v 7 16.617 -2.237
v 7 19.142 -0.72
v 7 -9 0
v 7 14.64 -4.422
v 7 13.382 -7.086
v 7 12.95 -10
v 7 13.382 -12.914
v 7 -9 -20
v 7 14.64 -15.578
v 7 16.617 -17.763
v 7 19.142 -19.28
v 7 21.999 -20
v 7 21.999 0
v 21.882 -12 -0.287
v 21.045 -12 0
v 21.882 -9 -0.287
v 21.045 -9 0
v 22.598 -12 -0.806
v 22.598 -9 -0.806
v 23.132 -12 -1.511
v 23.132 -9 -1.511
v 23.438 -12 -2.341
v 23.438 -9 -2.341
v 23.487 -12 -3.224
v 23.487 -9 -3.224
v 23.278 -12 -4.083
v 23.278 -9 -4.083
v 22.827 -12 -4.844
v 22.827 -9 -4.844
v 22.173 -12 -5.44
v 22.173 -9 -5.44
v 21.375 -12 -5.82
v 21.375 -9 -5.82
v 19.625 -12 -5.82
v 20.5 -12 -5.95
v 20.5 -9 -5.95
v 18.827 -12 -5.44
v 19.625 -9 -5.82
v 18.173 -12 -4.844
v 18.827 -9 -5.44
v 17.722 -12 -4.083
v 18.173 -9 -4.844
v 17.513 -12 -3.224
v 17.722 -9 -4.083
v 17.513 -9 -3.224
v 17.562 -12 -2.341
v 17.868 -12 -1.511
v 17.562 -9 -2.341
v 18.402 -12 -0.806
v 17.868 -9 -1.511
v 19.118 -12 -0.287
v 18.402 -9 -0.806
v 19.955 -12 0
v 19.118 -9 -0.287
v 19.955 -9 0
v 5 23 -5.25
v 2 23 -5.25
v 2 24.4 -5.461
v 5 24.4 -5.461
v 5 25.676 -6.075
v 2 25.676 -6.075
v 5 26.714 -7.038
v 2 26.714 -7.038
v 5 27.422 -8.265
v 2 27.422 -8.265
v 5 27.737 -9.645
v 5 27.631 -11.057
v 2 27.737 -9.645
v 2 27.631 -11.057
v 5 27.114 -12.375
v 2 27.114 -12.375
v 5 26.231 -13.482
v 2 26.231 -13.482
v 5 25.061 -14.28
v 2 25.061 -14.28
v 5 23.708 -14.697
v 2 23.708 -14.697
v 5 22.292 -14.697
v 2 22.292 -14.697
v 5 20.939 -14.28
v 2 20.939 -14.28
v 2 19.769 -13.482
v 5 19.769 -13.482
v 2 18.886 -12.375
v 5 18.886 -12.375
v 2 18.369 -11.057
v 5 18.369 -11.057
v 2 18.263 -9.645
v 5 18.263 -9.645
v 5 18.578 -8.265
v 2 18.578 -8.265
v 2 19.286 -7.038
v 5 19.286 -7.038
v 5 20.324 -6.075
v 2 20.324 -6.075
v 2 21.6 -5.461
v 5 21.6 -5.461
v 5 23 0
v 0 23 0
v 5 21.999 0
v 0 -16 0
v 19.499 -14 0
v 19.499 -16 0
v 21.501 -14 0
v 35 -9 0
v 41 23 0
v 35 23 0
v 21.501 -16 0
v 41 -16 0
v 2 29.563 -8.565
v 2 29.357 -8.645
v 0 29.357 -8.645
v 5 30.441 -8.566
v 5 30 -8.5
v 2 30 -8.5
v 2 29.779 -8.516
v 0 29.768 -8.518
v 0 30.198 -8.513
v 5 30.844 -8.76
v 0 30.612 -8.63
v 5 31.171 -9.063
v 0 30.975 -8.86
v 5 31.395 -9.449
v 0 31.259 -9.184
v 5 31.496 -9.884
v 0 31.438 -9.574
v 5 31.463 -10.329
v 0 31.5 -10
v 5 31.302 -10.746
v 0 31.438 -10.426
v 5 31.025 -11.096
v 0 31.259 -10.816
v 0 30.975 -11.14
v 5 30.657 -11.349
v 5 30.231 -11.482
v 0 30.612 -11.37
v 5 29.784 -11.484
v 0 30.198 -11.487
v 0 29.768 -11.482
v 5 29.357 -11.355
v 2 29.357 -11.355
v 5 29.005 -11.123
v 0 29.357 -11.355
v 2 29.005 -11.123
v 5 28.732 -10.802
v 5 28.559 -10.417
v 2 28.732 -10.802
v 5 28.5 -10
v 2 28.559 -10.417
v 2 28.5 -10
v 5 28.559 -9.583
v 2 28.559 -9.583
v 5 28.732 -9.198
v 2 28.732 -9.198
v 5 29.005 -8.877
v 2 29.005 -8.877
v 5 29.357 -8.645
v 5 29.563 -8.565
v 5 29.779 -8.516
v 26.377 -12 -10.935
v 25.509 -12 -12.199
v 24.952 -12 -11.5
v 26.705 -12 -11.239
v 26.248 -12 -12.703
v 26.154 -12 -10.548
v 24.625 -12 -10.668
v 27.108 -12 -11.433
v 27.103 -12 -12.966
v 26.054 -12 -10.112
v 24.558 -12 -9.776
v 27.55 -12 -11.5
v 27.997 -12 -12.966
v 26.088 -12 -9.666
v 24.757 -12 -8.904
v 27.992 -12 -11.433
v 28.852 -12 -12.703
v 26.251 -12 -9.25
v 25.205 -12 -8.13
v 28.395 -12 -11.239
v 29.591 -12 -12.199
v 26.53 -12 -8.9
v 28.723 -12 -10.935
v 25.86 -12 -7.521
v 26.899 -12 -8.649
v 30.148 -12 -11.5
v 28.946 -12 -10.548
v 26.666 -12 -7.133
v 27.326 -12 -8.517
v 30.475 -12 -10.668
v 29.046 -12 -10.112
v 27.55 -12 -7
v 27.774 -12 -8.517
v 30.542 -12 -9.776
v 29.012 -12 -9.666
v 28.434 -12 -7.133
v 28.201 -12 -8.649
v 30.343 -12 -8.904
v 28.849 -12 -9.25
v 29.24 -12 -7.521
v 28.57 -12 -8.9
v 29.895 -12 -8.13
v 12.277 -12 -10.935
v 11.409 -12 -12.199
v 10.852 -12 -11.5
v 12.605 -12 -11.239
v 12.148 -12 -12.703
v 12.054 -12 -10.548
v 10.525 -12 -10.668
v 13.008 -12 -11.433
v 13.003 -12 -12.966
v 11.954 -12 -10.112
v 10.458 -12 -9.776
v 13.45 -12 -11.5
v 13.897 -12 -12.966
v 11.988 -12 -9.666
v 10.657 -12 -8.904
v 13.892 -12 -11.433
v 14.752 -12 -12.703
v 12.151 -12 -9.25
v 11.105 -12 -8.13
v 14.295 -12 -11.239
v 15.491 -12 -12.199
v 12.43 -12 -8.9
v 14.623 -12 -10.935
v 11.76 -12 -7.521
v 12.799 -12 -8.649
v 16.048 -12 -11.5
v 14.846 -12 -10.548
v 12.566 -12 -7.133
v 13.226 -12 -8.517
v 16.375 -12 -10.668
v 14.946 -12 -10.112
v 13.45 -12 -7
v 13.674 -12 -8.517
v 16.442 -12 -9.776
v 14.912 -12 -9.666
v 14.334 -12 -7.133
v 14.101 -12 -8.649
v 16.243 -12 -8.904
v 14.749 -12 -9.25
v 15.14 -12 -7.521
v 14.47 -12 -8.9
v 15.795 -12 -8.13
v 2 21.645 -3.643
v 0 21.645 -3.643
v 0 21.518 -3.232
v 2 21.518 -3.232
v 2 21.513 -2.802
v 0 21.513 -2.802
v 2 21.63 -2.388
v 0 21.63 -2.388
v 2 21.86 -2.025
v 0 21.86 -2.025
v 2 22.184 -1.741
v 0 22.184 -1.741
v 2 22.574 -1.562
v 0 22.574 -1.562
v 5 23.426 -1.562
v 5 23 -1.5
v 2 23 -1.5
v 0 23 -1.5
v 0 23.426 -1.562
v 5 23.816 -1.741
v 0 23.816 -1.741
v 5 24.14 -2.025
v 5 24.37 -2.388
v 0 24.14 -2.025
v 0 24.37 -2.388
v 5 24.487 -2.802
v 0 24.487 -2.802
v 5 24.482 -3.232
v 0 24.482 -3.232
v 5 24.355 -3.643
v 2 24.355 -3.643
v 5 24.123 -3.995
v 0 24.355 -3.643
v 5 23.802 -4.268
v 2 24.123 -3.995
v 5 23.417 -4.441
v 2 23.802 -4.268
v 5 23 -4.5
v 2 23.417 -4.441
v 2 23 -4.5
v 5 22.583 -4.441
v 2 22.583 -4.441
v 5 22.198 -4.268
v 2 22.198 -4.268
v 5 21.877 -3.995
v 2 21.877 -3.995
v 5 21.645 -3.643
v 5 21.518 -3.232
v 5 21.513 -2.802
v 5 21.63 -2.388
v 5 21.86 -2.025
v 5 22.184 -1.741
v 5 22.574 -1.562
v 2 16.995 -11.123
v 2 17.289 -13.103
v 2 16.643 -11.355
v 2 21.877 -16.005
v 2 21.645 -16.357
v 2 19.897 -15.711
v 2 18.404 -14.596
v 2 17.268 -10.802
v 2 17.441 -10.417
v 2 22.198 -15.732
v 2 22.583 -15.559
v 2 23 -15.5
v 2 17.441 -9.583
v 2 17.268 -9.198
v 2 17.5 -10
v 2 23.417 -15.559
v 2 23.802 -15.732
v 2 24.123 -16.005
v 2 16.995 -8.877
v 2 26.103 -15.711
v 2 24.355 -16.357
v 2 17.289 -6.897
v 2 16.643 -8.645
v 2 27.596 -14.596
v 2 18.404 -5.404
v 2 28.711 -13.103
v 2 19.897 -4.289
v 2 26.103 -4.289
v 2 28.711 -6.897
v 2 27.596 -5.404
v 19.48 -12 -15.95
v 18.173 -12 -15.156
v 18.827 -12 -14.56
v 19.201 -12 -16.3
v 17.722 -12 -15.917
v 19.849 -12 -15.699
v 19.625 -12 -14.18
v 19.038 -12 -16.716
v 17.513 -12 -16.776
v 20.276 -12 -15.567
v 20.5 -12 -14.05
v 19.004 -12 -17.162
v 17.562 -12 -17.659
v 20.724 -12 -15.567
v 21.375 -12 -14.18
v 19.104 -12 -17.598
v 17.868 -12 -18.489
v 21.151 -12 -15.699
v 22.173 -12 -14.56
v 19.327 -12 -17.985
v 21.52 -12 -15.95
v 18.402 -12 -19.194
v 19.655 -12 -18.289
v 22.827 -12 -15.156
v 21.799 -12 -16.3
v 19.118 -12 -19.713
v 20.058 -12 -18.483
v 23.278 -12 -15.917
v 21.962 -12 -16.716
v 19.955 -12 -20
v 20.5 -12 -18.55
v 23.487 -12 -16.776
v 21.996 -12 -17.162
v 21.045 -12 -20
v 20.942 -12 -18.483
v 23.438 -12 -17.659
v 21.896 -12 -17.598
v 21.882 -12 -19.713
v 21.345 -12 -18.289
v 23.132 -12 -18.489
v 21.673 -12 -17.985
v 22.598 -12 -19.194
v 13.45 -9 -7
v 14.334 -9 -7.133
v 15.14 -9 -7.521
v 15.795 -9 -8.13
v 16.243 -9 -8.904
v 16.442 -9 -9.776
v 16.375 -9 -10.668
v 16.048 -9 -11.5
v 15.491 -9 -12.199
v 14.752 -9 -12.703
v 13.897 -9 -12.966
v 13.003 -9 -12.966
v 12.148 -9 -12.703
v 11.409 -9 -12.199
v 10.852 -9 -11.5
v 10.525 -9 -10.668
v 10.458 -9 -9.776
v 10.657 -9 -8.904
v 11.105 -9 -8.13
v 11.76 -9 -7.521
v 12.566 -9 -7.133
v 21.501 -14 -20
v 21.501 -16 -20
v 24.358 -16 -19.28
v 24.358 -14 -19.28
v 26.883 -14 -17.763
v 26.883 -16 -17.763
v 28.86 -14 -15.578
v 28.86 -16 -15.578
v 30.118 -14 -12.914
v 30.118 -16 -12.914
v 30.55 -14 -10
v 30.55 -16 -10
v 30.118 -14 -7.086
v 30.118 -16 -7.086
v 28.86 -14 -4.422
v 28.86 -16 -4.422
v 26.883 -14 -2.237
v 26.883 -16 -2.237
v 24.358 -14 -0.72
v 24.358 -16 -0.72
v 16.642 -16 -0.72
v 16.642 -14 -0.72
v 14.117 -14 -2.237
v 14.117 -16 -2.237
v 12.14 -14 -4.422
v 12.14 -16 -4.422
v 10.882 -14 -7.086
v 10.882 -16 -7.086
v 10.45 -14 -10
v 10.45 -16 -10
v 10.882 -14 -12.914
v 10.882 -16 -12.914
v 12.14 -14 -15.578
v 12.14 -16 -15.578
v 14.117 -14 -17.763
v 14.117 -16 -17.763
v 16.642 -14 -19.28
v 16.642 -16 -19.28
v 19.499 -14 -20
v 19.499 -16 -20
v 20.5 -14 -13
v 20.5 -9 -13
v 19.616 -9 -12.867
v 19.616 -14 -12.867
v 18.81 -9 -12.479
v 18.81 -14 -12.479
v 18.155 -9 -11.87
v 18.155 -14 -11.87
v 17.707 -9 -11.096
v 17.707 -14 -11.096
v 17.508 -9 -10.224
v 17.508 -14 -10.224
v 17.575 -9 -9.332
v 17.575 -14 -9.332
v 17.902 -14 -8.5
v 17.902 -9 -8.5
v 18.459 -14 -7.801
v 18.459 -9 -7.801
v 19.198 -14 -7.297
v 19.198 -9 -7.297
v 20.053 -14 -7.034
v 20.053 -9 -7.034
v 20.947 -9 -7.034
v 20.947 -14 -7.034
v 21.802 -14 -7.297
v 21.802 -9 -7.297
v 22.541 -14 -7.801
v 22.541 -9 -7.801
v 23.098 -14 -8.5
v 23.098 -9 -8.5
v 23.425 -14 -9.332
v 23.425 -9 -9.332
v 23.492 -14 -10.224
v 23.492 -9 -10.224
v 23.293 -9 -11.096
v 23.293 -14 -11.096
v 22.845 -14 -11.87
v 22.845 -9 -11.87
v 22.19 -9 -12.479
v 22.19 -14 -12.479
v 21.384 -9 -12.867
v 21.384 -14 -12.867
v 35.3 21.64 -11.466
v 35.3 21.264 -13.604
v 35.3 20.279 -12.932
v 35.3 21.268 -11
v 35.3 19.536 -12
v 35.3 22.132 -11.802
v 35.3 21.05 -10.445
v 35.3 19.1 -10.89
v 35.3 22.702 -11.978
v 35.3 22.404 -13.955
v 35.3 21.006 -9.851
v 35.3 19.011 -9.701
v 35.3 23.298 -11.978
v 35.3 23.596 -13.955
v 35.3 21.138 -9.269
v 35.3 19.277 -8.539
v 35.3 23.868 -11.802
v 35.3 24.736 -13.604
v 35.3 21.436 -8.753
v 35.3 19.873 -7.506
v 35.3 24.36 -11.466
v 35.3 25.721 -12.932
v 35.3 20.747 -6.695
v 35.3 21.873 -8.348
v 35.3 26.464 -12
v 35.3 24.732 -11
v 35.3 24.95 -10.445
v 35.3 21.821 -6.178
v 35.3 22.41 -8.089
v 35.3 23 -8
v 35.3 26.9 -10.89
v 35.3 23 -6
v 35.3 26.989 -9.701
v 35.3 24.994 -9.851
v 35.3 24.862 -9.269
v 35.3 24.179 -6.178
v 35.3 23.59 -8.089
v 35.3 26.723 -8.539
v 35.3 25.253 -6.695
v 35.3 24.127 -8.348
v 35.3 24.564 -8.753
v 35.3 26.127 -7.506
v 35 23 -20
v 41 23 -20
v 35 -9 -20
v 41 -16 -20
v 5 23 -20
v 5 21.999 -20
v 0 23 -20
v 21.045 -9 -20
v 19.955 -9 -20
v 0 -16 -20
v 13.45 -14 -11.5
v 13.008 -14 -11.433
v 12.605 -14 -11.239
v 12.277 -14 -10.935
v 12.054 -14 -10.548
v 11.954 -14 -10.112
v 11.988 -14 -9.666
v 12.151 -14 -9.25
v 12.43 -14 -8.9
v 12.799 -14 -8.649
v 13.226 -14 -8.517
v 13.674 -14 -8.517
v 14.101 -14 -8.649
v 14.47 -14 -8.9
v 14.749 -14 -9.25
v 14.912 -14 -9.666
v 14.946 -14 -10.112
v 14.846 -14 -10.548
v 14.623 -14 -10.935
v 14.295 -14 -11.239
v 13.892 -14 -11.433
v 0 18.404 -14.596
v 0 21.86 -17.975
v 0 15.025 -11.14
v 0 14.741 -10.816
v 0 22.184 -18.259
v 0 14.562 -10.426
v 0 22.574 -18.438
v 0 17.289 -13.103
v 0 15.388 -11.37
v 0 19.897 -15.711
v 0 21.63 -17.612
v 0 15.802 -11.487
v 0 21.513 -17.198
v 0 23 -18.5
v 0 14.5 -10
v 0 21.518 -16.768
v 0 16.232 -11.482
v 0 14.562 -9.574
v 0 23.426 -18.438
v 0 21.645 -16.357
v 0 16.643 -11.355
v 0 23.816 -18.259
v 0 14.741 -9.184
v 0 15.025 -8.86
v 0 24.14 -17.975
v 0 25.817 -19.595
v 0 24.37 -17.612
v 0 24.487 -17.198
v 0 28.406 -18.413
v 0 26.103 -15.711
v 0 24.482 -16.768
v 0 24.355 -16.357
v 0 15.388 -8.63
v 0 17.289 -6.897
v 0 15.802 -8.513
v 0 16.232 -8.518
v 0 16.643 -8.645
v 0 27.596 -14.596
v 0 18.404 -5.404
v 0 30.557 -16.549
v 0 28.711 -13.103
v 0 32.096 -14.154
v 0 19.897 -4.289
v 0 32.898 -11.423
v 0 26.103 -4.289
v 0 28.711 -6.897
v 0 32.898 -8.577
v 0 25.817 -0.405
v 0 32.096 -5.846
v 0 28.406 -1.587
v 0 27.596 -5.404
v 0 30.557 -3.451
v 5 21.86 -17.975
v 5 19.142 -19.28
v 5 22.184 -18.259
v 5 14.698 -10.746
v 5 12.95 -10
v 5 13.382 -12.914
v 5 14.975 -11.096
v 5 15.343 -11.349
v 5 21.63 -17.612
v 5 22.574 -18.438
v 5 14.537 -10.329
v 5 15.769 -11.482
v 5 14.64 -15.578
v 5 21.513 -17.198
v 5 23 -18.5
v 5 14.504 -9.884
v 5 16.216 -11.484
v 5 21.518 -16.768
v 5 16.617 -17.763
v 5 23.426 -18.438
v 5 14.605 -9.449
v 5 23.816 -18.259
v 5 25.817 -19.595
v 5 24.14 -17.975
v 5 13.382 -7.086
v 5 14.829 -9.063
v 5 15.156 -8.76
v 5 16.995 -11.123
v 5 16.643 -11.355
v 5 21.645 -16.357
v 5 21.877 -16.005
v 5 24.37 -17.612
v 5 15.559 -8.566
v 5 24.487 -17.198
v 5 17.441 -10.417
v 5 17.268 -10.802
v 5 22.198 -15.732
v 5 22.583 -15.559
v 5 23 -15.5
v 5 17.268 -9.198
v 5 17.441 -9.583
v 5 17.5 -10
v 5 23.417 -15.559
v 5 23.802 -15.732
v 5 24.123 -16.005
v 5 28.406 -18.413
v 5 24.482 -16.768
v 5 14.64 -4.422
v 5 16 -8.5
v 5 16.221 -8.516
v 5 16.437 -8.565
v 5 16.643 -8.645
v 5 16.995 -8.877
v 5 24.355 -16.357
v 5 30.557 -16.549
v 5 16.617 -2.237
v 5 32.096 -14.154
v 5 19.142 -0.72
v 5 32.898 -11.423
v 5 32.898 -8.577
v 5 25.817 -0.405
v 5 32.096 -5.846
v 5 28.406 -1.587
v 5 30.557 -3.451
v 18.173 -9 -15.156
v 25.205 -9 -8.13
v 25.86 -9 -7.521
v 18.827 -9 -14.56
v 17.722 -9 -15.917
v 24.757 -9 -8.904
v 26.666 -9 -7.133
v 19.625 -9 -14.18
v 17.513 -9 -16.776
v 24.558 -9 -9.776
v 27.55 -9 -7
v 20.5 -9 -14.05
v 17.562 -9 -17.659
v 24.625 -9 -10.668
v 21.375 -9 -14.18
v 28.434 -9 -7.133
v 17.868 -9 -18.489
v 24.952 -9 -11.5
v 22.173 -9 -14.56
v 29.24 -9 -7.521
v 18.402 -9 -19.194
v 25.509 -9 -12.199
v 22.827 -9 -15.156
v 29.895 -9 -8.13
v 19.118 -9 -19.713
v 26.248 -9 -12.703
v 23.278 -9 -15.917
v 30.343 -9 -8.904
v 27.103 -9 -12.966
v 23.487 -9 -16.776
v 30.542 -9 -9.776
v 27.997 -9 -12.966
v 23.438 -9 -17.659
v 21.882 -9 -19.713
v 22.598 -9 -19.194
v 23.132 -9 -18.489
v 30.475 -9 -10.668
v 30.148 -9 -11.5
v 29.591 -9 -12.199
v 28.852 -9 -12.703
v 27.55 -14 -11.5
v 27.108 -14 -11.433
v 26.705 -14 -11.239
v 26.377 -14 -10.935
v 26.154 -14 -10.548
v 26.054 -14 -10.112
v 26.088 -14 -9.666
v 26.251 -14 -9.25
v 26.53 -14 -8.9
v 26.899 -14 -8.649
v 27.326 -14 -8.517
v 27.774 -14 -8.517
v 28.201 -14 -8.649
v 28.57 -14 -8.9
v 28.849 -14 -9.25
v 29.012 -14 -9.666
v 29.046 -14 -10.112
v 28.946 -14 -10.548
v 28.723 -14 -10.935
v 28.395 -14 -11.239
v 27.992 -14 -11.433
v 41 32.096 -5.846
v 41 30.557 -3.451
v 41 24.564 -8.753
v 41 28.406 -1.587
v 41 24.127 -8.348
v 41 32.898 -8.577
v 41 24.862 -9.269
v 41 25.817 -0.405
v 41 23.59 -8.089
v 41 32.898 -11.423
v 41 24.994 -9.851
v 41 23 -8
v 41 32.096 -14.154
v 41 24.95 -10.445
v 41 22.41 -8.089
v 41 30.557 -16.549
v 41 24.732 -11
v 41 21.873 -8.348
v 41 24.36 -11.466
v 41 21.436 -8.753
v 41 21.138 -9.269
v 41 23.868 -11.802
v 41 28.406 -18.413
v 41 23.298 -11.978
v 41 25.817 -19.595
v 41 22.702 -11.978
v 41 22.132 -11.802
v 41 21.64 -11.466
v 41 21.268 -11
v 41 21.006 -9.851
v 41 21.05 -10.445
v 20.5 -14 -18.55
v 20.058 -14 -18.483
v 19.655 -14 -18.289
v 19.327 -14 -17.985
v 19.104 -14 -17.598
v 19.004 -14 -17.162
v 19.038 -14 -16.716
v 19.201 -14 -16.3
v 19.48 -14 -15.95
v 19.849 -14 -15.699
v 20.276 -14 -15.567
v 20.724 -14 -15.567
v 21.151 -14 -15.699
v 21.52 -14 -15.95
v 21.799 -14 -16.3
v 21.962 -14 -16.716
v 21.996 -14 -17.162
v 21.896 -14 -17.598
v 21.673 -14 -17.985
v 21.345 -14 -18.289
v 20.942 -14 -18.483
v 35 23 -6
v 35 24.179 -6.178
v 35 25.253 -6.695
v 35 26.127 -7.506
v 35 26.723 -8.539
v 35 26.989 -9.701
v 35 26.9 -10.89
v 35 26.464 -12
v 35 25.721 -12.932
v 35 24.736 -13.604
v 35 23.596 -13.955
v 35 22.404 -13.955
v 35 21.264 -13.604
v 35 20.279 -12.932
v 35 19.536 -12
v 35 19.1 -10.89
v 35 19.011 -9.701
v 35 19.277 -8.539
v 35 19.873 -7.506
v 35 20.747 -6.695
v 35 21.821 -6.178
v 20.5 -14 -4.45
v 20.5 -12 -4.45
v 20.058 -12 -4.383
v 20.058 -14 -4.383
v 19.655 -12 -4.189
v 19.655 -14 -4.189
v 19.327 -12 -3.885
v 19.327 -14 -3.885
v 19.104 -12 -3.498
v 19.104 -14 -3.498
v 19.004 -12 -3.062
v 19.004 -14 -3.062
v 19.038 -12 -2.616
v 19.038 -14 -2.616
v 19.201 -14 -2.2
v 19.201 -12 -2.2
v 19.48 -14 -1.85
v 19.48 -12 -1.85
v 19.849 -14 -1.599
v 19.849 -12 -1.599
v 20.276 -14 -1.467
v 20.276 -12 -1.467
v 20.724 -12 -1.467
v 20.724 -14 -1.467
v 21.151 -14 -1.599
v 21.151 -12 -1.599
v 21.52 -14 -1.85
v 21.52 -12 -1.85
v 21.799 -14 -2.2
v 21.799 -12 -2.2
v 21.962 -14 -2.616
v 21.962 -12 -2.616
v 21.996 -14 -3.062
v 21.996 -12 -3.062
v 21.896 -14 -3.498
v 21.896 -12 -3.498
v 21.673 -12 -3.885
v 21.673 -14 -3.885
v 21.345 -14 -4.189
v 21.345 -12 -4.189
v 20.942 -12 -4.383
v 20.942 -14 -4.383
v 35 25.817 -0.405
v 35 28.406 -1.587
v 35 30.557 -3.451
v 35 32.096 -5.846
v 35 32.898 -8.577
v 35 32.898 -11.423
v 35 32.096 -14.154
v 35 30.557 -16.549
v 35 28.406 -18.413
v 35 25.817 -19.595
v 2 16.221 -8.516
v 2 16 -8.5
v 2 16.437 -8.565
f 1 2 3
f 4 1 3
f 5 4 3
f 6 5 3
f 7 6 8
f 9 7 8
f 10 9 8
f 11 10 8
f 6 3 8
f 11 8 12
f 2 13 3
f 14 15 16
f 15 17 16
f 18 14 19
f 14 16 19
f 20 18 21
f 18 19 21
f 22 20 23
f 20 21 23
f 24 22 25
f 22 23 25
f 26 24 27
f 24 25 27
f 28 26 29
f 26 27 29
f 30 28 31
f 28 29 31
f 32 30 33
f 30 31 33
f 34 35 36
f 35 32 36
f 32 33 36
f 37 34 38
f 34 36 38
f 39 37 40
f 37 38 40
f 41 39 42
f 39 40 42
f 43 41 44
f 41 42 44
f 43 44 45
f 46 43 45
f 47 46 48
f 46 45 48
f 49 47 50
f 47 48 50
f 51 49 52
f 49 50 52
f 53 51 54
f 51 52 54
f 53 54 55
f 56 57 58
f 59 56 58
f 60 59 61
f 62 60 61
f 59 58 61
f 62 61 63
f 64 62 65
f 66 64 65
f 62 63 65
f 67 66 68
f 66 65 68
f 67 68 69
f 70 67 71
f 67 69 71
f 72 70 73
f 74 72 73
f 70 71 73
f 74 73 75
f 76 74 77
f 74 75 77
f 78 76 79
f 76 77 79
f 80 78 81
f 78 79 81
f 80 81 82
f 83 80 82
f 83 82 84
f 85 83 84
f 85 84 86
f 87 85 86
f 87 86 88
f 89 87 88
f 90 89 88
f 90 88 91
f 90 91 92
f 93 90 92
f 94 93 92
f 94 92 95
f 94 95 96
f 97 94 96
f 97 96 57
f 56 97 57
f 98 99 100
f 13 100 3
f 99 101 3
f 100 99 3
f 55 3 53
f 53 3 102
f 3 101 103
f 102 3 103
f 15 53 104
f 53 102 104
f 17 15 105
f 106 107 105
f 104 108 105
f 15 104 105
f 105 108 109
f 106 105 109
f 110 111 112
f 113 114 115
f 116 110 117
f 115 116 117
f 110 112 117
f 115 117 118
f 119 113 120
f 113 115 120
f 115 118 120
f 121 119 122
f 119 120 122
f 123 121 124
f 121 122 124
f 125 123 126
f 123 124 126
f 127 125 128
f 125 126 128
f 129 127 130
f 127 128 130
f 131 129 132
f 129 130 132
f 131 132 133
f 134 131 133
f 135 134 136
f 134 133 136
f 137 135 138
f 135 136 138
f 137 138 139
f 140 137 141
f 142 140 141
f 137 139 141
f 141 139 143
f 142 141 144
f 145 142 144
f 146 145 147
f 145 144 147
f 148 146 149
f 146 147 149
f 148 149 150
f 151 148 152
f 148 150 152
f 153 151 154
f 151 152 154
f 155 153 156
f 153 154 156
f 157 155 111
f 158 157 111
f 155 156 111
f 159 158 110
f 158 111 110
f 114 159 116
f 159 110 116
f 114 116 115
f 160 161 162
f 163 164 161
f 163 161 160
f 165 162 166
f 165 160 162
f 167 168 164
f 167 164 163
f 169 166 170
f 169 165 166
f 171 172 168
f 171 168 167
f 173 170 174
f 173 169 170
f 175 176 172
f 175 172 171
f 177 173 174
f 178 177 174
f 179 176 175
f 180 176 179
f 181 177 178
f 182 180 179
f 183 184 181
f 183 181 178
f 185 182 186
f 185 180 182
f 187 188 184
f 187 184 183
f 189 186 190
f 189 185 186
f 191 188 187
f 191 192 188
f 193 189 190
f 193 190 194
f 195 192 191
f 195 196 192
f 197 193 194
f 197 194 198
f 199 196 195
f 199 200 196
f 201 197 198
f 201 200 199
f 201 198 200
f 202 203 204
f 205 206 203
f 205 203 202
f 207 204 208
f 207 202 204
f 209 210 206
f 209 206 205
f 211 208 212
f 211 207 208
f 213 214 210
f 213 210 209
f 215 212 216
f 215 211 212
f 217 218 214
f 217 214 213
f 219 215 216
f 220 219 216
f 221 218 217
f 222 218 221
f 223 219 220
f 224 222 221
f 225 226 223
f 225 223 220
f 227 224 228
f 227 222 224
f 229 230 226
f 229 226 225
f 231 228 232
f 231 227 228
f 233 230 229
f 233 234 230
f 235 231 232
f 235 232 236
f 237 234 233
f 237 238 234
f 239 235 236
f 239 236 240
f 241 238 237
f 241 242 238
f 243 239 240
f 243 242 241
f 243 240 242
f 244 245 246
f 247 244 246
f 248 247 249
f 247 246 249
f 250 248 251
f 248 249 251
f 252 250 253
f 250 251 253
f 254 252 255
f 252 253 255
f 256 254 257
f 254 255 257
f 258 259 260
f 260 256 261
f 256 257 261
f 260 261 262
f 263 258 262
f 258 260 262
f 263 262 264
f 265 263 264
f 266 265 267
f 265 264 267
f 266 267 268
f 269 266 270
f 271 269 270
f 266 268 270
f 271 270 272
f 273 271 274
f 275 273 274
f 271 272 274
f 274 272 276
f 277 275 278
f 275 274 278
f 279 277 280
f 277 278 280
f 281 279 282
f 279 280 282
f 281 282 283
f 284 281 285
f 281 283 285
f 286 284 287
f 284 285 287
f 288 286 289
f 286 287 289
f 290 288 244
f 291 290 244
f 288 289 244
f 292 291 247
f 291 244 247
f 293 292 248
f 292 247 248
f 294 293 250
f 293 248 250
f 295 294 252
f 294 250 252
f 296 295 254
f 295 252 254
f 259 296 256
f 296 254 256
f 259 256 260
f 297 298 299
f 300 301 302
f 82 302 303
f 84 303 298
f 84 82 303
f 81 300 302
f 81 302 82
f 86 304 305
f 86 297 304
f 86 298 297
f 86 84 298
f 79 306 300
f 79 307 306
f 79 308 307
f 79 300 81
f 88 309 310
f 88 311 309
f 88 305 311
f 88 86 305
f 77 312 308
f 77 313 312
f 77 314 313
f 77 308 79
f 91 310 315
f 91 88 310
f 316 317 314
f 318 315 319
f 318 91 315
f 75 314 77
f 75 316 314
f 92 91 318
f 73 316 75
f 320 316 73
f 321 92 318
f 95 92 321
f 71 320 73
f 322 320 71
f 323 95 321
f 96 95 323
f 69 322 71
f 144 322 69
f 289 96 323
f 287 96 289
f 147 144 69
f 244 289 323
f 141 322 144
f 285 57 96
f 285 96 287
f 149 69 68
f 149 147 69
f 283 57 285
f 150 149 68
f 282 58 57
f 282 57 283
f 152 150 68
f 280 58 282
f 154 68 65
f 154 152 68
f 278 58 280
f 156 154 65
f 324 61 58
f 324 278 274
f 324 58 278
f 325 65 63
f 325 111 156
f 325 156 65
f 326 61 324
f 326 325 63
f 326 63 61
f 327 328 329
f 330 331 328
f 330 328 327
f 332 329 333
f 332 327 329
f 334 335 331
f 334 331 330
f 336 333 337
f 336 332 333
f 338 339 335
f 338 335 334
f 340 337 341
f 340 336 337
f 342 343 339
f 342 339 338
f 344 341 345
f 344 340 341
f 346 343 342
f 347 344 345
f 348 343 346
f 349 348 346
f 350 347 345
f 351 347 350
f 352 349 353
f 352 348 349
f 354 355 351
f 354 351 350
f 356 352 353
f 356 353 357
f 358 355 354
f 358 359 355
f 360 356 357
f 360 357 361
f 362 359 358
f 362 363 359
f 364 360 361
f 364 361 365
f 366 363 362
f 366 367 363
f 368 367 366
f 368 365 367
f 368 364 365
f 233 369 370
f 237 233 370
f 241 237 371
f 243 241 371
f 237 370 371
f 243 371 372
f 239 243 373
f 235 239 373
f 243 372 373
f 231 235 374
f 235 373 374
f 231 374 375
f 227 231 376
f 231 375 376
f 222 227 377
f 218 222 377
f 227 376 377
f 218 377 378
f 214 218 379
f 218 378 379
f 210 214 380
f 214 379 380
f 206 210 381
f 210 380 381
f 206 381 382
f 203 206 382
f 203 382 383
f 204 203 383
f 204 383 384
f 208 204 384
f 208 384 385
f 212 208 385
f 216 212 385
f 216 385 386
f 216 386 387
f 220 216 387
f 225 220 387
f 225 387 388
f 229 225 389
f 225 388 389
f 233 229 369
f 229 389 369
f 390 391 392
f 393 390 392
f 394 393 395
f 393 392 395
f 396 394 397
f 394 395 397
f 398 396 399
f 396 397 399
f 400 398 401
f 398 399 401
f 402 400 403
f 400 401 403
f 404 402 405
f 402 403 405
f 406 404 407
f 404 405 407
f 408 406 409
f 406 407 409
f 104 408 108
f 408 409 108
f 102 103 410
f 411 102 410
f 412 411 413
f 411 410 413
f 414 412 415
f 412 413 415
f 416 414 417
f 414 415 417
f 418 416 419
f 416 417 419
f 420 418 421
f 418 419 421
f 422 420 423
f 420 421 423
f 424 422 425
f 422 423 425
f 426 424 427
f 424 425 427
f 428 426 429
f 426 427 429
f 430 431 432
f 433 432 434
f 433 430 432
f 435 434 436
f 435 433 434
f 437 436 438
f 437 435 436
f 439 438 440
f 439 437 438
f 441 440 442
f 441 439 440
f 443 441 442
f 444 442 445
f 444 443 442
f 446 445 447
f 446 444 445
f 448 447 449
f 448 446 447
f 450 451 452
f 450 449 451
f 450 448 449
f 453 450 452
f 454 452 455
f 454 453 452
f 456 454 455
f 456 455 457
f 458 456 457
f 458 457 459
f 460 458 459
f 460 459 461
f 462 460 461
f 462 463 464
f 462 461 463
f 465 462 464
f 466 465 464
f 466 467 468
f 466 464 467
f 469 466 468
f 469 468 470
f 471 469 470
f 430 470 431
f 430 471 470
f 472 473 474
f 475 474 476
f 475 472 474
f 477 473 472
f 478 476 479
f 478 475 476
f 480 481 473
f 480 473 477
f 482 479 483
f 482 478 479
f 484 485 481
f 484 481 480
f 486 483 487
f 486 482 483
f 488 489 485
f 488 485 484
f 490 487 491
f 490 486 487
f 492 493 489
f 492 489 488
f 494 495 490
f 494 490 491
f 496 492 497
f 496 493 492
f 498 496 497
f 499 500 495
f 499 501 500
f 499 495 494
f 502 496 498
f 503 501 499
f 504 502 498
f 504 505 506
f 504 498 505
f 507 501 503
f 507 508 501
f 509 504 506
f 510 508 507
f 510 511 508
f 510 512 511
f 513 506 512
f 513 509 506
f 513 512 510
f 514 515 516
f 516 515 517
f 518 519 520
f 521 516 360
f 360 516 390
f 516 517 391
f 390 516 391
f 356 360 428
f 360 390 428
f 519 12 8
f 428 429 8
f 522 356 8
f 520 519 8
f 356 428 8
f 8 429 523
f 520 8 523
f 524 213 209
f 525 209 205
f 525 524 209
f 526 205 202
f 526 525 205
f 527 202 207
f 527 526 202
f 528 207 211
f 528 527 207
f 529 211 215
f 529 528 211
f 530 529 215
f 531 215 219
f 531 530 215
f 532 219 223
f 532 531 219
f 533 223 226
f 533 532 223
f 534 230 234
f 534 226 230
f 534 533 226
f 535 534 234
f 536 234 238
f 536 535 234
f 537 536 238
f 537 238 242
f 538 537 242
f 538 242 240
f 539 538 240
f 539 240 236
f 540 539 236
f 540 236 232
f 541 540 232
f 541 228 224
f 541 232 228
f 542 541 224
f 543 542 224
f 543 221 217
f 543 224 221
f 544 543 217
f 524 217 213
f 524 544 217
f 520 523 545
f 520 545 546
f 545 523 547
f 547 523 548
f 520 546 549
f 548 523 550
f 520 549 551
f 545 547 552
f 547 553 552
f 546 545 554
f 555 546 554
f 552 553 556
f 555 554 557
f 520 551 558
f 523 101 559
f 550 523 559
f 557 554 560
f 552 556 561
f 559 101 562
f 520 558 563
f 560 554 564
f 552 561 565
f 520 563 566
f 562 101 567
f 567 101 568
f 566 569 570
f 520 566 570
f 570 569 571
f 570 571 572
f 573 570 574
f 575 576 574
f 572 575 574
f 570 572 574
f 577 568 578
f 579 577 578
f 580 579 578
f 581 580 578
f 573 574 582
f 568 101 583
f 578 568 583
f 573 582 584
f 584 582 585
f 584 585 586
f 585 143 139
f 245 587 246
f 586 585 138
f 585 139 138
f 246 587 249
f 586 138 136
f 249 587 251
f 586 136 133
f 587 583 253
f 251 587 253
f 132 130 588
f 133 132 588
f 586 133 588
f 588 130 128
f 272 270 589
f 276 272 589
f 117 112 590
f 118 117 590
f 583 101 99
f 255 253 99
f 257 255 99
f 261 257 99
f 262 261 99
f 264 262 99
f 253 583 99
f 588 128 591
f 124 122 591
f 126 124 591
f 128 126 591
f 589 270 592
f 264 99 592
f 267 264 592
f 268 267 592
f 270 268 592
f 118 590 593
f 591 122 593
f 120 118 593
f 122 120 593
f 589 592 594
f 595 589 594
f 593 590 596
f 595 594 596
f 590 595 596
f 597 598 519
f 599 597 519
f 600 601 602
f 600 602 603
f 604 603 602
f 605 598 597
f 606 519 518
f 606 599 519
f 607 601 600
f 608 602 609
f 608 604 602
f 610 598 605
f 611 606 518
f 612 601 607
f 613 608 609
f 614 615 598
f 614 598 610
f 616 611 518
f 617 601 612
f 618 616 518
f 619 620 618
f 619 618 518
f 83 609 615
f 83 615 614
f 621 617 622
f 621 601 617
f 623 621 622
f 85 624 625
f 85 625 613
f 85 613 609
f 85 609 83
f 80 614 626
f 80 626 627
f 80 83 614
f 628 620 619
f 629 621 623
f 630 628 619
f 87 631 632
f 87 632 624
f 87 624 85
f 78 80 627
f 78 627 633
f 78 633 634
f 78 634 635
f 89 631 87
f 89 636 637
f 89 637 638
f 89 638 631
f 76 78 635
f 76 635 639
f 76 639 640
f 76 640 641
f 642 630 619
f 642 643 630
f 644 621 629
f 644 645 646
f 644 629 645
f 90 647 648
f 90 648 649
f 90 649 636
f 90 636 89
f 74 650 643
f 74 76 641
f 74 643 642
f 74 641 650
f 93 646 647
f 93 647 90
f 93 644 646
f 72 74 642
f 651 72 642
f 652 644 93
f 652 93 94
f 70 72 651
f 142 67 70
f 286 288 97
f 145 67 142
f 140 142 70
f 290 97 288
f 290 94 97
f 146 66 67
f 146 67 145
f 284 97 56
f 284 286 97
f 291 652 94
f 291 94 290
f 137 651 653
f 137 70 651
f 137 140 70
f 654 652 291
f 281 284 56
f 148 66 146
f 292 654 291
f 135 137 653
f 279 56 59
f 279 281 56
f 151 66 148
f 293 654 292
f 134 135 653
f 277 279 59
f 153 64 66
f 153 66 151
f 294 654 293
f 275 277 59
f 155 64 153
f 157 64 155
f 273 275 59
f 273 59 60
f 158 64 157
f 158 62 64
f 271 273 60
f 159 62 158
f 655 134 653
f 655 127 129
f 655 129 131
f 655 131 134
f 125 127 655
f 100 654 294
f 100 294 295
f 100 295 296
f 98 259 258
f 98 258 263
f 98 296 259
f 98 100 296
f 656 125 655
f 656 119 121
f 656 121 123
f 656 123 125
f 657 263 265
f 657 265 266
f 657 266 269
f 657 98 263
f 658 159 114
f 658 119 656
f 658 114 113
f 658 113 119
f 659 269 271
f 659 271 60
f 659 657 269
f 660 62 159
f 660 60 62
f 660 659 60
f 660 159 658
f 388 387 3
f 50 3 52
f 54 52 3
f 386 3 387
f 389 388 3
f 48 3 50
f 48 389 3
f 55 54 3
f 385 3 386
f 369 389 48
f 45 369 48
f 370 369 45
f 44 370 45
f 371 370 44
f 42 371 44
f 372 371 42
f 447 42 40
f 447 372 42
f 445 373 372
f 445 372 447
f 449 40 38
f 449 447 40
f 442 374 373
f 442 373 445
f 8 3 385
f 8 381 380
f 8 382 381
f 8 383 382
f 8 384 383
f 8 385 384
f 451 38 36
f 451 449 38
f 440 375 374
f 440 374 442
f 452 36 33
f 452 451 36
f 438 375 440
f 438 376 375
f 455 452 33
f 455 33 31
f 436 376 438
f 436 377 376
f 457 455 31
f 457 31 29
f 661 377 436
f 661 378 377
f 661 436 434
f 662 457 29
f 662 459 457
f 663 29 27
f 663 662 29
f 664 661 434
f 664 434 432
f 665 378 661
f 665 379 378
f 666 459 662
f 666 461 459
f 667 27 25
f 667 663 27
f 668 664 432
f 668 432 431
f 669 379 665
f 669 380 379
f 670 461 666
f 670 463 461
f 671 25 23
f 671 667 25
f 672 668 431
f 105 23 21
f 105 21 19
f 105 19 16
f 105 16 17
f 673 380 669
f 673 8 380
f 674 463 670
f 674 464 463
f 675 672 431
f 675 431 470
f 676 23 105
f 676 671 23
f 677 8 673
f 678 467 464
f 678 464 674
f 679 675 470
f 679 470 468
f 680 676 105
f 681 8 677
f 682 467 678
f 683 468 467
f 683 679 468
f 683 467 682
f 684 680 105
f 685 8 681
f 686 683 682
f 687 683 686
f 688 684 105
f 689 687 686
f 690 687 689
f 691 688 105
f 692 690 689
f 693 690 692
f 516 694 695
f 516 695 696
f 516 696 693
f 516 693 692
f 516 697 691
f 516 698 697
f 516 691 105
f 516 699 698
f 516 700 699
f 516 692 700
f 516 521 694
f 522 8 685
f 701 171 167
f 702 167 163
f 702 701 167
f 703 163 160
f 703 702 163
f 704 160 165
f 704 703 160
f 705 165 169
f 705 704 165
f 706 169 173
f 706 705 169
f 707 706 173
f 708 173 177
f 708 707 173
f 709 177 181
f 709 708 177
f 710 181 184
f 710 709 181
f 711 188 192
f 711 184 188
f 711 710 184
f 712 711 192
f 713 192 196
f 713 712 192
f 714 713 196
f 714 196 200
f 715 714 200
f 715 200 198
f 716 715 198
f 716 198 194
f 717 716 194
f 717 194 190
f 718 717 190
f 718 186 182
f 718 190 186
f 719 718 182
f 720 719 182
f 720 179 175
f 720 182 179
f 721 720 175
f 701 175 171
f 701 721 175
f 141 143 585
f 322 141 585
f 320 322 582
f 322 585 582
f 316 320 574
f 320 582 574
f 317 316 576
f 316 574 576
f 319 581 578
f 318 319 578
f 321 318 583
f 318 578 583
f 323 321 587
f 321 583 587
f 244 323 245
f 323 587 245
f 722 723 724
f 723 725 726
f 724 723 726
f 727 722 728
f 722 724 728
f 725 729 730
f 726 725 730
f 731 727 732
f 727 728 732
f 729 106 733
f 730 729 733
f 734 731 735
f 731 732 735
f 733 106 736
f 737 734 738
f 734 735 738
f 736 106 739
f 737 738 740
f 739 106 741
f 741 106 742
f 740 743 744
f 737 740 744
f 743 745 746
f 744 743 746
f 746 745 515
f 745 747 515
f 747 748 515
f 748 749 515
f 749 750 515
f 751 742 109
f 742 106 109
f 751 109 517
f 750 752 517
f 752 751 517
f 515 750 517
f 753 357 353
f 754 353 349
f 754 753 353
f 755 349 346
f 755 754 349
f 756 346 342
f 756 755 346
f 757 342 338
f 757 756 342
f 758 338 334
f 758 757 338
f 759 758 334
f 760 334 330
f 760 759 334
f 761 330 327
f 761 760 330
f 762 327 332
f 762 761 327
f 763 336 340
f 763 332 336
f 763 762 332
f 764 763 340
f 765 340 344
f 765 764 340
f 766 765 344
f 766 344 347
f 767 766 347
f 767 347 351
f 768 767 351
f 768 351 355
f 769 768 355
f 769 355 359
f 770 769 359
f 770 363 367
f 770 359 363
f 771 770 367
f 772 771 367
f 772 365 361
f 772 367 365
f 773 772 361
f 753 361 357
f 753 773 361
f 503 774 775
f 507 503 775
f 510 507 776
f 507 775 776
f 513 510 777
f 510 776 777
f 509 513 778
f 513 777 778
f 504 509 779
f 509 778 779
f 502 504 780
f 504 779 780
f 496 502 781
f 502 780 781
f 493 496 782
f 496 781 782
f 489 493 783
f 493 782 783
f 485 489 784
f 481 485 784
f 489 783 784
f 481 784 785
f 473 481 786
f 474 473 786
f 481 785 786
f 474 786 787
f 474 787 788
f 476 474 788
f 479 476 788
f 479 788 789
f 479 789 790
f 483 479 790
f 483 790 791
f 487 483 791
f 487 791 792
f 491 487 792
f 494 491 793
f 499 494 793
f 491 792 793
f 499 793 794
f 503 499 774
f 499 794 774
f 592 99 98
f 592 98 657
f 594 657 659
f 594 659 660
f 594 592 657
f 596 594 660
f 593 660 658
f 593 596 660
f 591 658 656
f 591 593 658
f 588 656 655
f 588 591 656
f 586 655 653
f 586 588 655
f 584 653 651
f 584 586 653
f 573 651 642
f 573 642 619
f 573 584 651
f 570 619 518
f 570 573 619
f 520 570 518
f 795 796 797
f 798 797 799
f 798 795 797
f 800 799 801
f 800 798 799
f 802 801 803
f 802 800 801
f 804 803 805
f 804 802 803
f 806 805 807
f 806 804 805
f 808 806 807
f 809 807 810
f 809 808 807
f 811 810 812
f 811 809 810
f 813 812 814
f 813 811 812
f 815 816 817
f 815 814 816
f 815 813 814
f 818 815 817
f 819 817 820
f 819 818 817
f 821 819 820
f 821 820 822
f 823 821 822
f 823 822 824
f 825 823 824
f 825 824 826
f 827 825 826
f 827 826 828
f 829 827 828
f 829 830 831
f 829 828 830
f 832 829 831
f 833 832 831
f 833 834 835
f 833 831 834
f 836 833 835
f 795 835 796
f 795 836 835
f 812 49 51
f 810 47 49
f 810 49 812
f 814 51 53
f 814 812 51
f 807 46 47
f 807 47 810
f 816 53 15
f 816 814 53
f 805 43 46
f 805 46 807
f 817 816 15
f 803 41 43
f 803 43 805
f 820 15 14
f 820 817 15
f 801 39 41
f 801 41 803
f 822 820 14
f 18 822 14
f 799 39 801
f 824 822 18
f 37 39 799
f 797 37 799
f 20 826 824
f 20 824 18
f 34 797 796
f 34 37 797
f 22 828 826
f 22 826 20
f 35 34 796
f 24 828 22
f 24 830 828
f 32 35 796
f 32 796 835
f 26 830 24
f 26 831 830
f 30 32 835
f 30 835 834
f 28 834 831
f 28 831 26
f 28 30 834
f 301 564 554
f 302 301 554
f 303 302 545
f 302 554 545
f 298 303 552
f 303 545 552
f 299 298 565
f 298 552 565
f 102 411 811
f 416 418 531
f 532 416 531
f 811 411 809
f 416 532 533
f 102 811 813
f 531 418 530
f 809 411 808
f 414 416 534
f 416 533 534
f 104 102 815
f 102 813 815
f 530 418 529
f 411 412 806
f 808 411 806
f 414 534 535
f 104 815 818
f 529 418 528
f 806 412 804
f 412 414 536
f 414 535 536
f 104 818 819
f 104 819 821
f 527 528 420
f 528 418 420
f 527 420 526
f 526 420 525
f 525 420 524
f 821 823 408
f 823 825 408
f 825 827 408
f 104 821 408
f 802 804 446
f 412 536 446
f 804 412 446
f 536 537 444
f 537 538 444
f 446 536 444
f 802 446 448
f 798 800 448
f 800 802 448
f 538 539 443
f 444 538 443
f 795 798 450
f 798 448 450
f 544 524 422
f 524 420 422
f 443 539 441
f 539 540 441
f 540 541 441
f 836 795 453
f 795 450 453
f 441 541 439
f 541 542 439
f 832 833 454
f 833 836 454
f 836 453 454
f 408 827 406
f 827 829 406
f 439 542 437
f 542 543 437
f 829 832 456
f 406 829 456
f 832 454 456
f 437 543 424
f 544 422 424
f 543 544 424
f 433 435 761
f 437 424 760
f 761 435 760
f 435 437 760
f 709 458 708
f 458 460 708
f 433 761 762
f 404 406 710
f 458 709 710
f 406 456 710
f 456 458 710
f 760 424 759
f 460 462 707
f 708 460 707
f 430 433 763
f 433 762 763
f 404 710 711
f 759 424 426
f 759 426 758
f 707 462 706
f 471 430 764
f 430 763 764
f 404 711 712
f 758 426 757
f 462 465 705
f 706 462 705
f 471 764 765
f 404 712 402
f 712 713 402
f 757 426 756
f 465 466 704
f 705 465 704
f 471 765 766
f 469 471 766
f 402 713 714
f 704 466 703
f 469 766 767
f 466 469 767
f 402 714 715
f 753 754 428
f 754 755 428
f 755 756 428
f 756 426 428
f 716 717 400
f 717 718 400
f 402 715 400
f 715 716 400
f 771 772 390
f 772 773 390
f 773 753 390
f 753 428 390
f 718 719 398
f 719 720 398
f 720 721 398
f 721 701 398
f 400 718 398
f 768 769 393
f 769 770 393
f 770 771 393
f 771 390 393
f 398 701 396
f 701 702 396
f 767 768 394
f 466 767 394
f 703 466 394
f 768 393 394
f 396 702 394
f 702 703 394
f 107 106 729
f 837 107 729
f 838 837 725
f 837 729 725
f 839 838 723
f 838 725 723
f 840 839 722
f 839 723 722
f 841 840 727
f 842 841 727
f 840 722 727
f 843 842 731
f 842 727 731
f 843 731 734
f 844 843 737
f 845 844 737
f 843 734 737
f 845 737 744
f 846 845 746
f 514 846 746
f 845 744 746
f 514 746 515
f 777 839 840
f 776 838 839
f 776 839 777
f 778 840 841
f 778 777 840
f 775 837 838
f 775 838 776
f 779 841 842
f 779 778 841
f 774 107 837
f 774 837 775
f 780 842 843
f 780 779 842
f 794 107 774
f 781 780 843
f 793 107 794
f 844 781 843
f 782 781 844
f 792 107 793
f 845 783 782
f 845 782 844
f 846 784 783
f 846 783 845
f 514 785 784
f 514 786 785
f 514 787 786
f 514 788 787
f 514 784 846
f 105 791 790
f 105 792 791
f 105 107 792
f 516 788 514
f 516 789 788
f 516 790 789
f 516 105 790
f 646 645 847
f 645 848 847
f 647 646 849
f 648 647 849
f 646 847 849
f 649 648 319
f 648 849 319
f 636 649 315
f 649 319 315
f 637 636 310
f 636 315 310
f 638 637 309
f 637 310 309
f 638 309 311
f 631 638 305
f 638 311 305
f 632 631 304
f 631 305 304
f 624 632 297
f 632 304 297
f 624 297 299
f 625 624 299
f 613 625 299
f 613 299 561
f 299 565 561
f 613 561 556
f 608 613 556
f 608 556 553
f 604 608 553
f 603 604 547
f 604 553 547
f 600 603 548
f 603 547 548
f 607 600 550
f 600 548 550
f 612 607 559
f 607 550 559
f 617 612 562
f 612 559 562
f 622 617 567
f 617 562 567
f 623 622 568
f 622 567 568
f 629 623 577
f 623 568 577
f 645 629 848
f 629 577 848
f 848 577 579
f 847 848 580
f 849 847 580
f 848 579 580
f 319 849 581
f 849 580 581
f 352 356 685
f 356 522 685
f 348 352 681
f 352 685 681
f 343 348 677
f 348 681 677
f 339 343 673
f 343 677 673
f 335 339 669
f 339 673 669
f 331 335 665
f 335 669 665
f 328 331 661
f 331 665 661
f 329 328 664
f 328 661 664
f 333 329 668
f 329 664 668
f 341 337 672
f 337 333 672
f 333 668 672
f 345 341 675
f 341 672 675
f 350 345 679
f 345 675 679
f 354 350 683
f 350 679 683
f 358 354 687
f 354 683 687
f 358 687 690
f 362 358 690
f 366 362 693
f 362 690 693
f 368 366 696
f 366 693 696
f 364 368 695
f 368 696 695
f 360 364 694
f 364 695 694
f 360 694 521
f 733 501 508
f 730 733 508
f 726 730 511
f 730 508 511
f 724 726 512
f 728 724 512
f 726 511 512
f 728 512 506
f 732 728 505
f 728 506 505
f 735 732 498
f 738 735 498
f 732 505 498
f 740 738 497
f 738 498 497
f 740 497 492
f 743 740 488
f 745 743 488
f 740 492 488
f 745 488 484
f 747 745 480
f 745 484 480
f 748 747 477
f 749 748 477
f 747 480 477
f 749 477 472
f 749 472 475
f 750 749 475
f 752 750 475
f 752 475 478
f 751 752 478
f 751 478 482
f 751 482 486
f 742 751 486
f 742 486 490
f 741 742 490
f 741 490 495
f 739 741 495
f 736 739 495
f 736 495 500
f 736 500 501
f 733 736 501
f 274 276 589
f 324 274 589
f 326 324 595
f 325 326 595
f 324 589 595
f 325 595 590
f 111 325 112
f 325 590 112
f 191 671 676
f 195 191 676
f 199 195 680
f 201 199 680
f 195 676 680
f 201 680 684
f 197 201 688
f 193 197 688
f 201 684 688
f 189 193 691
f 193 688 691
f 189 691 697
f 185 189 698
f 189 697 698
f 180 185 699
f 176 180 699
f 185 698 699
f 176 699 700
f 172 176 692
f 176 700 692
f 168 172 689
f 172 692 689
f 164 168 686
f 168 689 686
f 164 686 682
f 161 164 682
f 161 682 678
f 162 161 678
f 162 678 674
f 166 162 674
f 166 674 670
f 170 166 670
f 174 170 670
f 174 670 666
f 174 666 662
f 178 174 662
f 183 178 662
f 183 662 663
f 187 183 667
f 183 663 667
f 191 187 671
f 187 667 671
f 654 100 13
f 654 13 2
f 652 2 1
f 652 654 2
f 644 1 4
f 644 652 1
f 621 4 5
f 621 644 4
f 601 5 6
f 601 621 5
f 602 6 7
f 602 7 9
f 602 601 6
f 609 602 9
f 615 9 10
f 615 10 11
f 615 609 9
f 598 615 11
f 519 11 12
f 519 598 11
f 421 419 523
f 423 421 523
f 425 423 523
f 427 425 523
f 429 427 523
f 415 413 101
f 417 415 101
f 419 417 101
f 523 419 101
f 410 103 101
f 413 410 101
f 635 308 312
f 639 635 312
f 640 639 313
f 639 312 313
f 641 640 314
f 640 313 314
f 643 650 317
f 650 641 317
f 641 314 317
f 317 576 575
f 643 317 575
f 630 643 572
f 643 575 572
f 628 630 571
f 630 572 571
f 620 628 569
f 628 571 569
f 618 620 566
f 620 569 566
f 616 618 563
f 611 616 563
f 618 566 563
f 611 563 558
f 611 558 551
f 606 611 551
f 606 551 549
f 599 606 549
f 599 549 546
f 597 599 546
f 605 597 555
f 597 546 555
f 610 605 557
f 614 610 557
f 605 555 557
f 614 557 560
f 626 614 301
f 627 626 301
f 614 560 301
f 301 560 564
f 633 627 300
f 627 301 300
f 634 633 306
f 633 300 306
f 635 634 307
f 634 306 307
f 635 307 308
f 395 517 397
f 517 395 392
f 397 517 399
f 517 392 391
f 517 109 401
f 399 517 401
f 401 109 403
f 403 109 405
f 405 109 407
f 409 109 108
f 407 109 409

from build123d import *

# Parameters (mm, degrees)
SKETCH1_W                = 41
SKETCH1_H                = 20
BOSS_EXTRUDE2_DEPTH      = 7
SKETCH3_R                = 10.05
CUT_EXTRUDE8_DEPTH       = 2
SKETCH4_R                = 1.5
SKETCH4_R_2              = 3
CUT_EXTRUDE9_DEPTH       = 29
SKETCH5_W                = 6
SKETCH5_H                = 20
SKETCH5_W_2              = 7
BOSS_EXTRUDE3_DEPTH      = 36
CUT_EXTRUDE10_DEPTH      = 36
SKETCH7_R                = 2
CUT_EXTRUDE11_DEPTH      = 51
SKETCH8_R                = 10.05
CUT_EXTRUDE12_DEPTH      = 2
SKETCH9_R                = 4.75
CUT_EXTRUDE13_DEPTH      = 3.25
SKETCH10_R               = 6.5
CUT_EXTRUDE14_DEPTH      = 2
CUT_EXTRUDE15_DEPTH      = 14
CUT_EXTRUDE15_DEPTH_BACK = 10
SKETCH12_R               = 1.5
CUT_EXTRUDE16_DEPTH      = 10
CUT_EXTRUDE17_DEPTH      = 10
MIRROR1_START            = 5
MIRROR1_DEPTH            = 2
MIRROR1_2_DEPTH          = 7
MIRROR1_3_DEPTH          = 5
CUT_EXTRUDE18_DEPTH      = 10
CUT_EXTRUDE18_DEPTH_BACK = 10
BOSS_EXTRUDE4_START      = 16
BOSS_EXTRUDE4_DEPTH      = 16
BOSS_EXTRUDE6_START      = -21
SKETCH16_W               = 28
SKETCH16_H               = 20
SKETCH16_R               = 1.5
SKETCH16_R_2             = 3
BOSS_EXTRUDE6_DEPTH      = 21
SKETCH18_W               = 28
SKETCH18_H               = 20
CUT_EXTRUDE21_DEPTH      = 16
CROQUIS2_R               = 3
CORTAR_EXTRUIR1_DEPTH    = 3
CROQUIS3_R               = 4
CORTAR_EXTRUIR2_DEPTH    = 0.3


# Read off the part's stored shape, not the designer's step: Mirror1
with BuildPart() as part:
    # Sketch1 → Boss-Extrude2 (new body)
    with BuildSketch(Plane(origin=(0, 0, 0), x_dir=(1, 0, 0), z_dir=(0, 1, 0))):
        with Locations((20.5, 10)):
            Rectangle(SKETCH1_W, SKETCH1_H)
    extrude(amount=BOSS_EXTRUDE2_DEPTH)

    # Sketch3 → Cut-Extrude8 (cut)
    with BuildSketch(Plane.XZ):
        with Locations((20.5, -10)):
            Circle(SKETCH3_R)
    extrude(amount=-CUT_EXTRUDE8_DEPTH, mode=Mode.SUBTRACT)

    # Sketch4 → Cut-Extrude9 (cut)
    with BuildSketch(Plane.XZ.offset(-2)):
        with Locations(Location((20.5, -2.95, 0), (0, 0, 270))):
            Circle(SKETCH4_R)
        with Locations(Location((27.55, -10, 0), (0, 0, 270))):
            Circle(SKETCH4_R)
        with Locations(Location((20.5, -17.05, 0), (0, 0, 270))):
            Circle(SKETCH4_R)
        with Locations(Location((13.45, -10, 0), (0, 0, 270))):
            Circle(SKETCH4_R)
        with Locations(Location((20.5, -10, 0), (0, 0, 270))):
            Circle(SKETCH4_R_2)
    extrude(amount=-CUT_EXTRUDE9_DEPTH, mode=Mode.SUBTRACT)

    # Sketch5 → Boss-Extrude3 (add)
    with BuildSketch(Plane(origin=(0, 7, 0), x_dir=(1, 0, 0), z_dir=(0, 1, 0))):
        with Locations((38, 10)):
            Rectangle(SKETCH5_W, SKETCH5_H)
        with Locations((3.5, 10)):
            Rectangle(SKETCH5_W_2, SKETCH5_H)
    extrude(amount=BOSS_EXTRUDE3_DEPTH)

    # Sketch6 → Cut-Extrude10 (cut)
    with BuildSketch(Plane.XY):
        Polygon((0, 33), (71.43253461, 33), (71.43253461, 55.308458538), (-13.966778087, 55.308458538), align=None)
    extrude(amount=-CUT_EXTRUDE10_DEPTH, mode=Mode.SUBTRACT)

    # Sketch7 → Cut-Extrude11 (cut)
    with BuildSketch(Plane.ZY):
        with Locations((-10, 23)):
            Circle(SKETCH7_R)
    extrude(amount=-CUT_EXTRUDE11_DEPTH, mode=Mode.SUBTRACT)

    # Sketch8 → Cut-Extrude12 (cut)
    with BuildSketch(Plane.ZY):
        with Locations((-10, 23)):
            Circle(SKETCH8_R)
    extrude(amount=-CUT_EXTRUDE12_DEPTH, mode=Mode.SUBTRACT)

    # Sketch9 → Cut-Extrude13 (cut)
    with BuildSketch(Plane.ZY.offset(-2)):
        with Locations((-10, 23)):
            Circle(SKETCH9_R)
    extrude(amount=-CUT_EXTRUDE13_DEPTH, mode=Mode.SUBTRACT)

    # Sketch10 → Cut-Extrude14 (cut)
    with BuildSketch(Plane(origin=(7, 0, 0), x_dir=(0, 0, -1), z_dir=(1, 0, 0))):
        with Locations((10, 23)):
            Circle(SKETCH10_R)
    extrude(amount=-CUT_EXTRUDE14_DEPTH, mode=Mode.SUBTRACT)

    # Sketch11 → Cut-Extrude15 (cut, two sides: drawn at the far end of the back side and taken through both)
    with BuildSketch(Plane.ZY.offset(-2).offset(-CUT_EXTRUDE15_DEPTH_BACK)):
        with BuildLine():
            Line((0, 23), (15.490351621, 23))
            Line((15.490351621, 23), (12.295560885, 45.157965149))
            Line((12.295560885, 45.157965149), (-24.464924867, 45.157965149))
            Line((-24.464924867, 45.157965149), (-29.902866546, 24.493786768))
            Line((-29.902866546, 24.493786768), (-20, 23))
            ThreePointArc((-20, 23), (-10, 33), (0, 23))
        make_face()
    extrude(amount=CUT_EXTRUDE15_DEPTH + CUT_EXTRUDE15_DEPTH_BACK, mode=Mode.SUBTRACT)

    # Sketch12 → Cut-Extrude16 (cut)
    with BuildSketch(Plane.ZY.offset(-2)):
        with Locations((-10, 30)):
            Circle(SKETCH12_R)
        with Locations((-3, 23)):
            Circle(SKETCH12_R)
        with Locations((-10, 16)):
            Circle(SKETCH12_R)
        with Locations((-17, 23)):
            Circle(SKETCH12_R)
    extrude(amount=-CUT_EXTRUDE16_DEPTH, mode=Mode.SUBTRACT)

    # Sketch13 → Cut-Extrude17 (cut)
    with BuildSketch(Plane(origin=(41, 0, 0), x_dir=(0, 0, -1), z_dir=(1, 0, 0))):
        with BuildLine():
            Line((20, 23), (26.17535893, 23))
            Line((26.17535893, 23), (24.098367316, 34.532076054))
            Line((24.098367316, 34.532076054), (-4.476002155, 34.532076054))
            Line((-4.476002155, 34.532076054), (-5.608906672, 23))
            Line((-5.608906672, 23), (0, 23))
            ThreePointArc((0, 23), (10, 33), (20, 23))
        make_face()
    extrude(amount=-CUT_EXTRUDE17_DEPTH, mode=Mode.SUBTRACT)

    # Mirror1 outline → Mirror1 (cut)
    with BuildSketch(Plane.YZ.offset(MIRROR1_START)):
        with BuildLine():
            Line((23, 0), (21.99875078, 0))
            ThreePointArc((21.99875078, 0), (12.95, -10), (21.99875078, -20))
            Line((21.99875078, -20), (23, -20))
            ThreePointArc((23, -20), (33, -10), (23, 0))
        make_face()
        with BuildLine():
            ThreePointArc((24.355261854, -16.357142857), (23, -18.5), (21.644738146, -16.357142857))
            ThreePointArc((21.644738146, -16.357142857), (18.403805922, -14.596194078), (16.642857143, -11.355261854))
            ThreePointArc((16.642857143, -11.355261854), (14.5, -10), (16.642857143, -8.644738146))
            ThreePointArc((16.642857143, -8.644738146), (18.403805922, -5.403805922), (21.644738146, -3.642857143))
            ThreePointArc((21.644738146, -3.642857143), (23, -1.5), (24.355261854, -3.642857143))
            ThreePointArc((24.355261854, -3.642857143), (27.596194078, -5.403805922), (29.357142857, -8.644738146))
            ThreePointArc((29.357142857, -8.644738146), (31.5, -10), (29.357142857, -11.355261854))
            ThreePointArc((29.357142857, -11.355261854), (27.596194078, -14.596194078), (24.355261854, -16.357142857))
        make_face(mode=Mode.SUBTRACT)
    extrude(amount=MIRROR1_DEPTH, mode=Mode.SUBTRACT)



with BuildPart() as body_2:
    # Mirror1 2 outline → Mirror1 2 (new body)
    with BuildSketch(Plane.YZ):
        with BuildLine():
            Line((43, 0), (24.00124922, 0))
            ThreePointArc((24.00124922, 0), (33.05, -10), (24.00124922, -20))
            Line((24.00124922, -20), (43, -20))
            Line((43, -20), (43, 0))
        make_face()
    extrude(amount=MIRROR1_2_DEPTH)


with BuildPart() as part_1:
    add(part.part)

    add(body_2.part)  # Mirror1 3 merges body 2
    # Mirror1 3 outline → Mirror1 3 (add)
    with BuildSketch(Plane.YZ):
        with BuildLine():
            ThreePointArc((21.99875078, 0), (12.95, -10), (21.99875078, -20))
            Line((21.99875078, -20), (24.00124922, -20))
            ThreePointArc((24.00124922, -20), (33.05, -10), (24.00124922, 0))
            Line((24.00124922, 0), (21.99875078, 0))
        make_face()
        with BuildLine():
            ThreePointArc((24.355261854, -16.357142857), (23, -18.5), (21.644738146, -16.357142857))
            ThreePointArc((21.644738146, -16.357142857), (18.403805922, -14.596194078), (16.642857143, -11.355261854))
            ThreePointArc((16.642857143, -11.355261854), (14.5, -10), (16.642857143, -8.644738146))
            ThreePointArc((16.642857143, -8.644738146), (18.403805922, -5.403805922), (21.644738146, -3.642857143))
            ThreePointArc((21.644738146, -3.642857143), (23, -1.5), (24.355261854, -3.642857143))
            ThreePointArc((24.355261854, -3.642857143), (27.596194078, -5.403805922), (29.357142857, -8.644738146))
            ThreePointArc((29.357142857, -8.644738146), (31.5, -10), (29.357142857, -11.355261854))
            ThreePointArc((29.357142857, -11.355261854), (27.596194078, -14.596194078), (24.355261854, -16.357142857))
        make_face(mode=Mode.SUBTRACT)
    extrude(amount=MIRROR1_3_DEPTH)

    # Sketch14 → Cut-Extrude18 (cut, two sides: drawn at the far end of the back side and taken through both)
    with BuildSketch(Plane(origin=(5, 0, 0), x_dir=(0, 0, -1), z_dir=(1, 0, 0)).offset(-CUT_EXTRUDE18_DEPTH_BACK)):
        with BuildLine():
            Line((20, 23), (39.442144398, 23))
            Line((39.442144398, 23), (24.053498228, 52.618460363))
            Line((24.053498228, 52.618460363), (-15.863160605, 48.721271778))
            Line((-15.863160605, 48.721271778), (-25.901373625, 22.149531431))
            Line((-25.901373625, 22.149531431), (0, 23))
            ThreePointArc((0, 23), (10, 33), (20, 23))
        make_face()
    extrude(amount=CUT_EXTRUDE18_DEPTH + CUT_EXTRUDE18_DEPTH_BACK, mode=Mode.SUBTRACT)

    # Sketch15 → Boss-Extrude4 (add)
    with BuildSketch(Plane.XZ.offset(BOSS_EXTRUDE4_START)):
        with BuildLine():
            Line((21.50124922, 0), (41, 0))
            Line((41, 0), (41, -20))
            Line((41, -20), (21.50124922, -20))
            ThreePointArc((21.50124922, -20), (30.55, -10), (21.50124922, 0))
        make_face()
        with BuildLine():
            Line((0, 0), (19.49875078, 0))
            ThreePointArc((19.49875078, 0), (10.45, -10), (19.49875078, -20))
            Line((19.49875078, -20), (0, -20))
            Line((0, -20), (0, 0))
        make_face()
    extrude(amount=-BOSS_EXTRUDE4_DEPTH)

    # Sketch16 → Boss-Extrude6 (add)
    with BuildSketch(Plane(origin=(0, 7, 0), x_dir=(1, 0, 0), z_dir=(0, 1, 0)).offset(BOSS_EXTRUDE6_START)):
        with Locations((21, 10)):
            Rectangle(SKETCH16_W, SKETCH16_H)
        with Locations(Location((27.55, 10, 0), (0, 0, 90))):
            Circle(SKETCH16_R, mode=Mode.SUBTRACT)
        with Locations(Location((20.5, 10, 0), (0, 0, 90))):
            Circle(SKETCH16_R_2, mode=Mode.SUBTRACT)
        with Locations(Location((13.45, 10, 0), (0, 0, 90))):
            Circle(SKETCH16_R, mode=Mode.SUBTRACT)
        with Locations(Location((20.5, 17.05, 0), (0, 0, 90))):
            Circle(SKETCH16_R, mode=Mode.SUBTRACT)
        with Locations(Location((20.5, 2.95, 0), (0, 0, 90))):
            Circle(SKETCH16_R, mode=Mode.SUBTRACT)
    extrude(amount=BOSS_EXTRUDE6_DEPTH)

    # Sketch18 → Cut-Extrude21 (cut)
    with BuildSketch(Plane(origin=(0, 7, 0), x_dir=(1, 0, 0), z_dir=(0, 1, 0))):
        with Locations((21, 10)):
            Rectangle(SKETCH18_W, SKETCH18_H)
    extrude(amount=-CUT_EXTRUDE21_DEPTH, mode=Mode.SUBTRACT)

    # Croquis2 → Cortar-Extruir1 (cut)
    with BuildSketch(Plane(origin=(0, -9, 0), x_dir=(1, 0, 0), z_dir=(0, 1, 0))):
        with Locations(Location((27.55, 10, 0), (0, 0, 270))):
            Circle(CROQUIS2_R)
        with Locations((20.5, 17.05)):
            Circle(CROQUIS2_R)
        with Locations(Location((13.45, 10, 0), (0, 0, 270))):
            Circle(CROQUIS2_R)
        with Locations((20.5, 2.95)):
            Circle(CROQUIS2_R)
    extrude(amount=-CORTAR_EXTRUIR1_DEPTH, mode=Mode.SUBTRACT)

    # Croquis3 → Cortar-Extruir2 (cut)
    with BuildSketch(Plane.ZY.offset(-35)):
        with Locations((-10, 23)):
            Circle(CROQUIS3_R)
    extrude(amount=-CORTAR_EXTRUIR2_DEPTH, mode=Mode.SUBTRACT)


solid = part_1.part
